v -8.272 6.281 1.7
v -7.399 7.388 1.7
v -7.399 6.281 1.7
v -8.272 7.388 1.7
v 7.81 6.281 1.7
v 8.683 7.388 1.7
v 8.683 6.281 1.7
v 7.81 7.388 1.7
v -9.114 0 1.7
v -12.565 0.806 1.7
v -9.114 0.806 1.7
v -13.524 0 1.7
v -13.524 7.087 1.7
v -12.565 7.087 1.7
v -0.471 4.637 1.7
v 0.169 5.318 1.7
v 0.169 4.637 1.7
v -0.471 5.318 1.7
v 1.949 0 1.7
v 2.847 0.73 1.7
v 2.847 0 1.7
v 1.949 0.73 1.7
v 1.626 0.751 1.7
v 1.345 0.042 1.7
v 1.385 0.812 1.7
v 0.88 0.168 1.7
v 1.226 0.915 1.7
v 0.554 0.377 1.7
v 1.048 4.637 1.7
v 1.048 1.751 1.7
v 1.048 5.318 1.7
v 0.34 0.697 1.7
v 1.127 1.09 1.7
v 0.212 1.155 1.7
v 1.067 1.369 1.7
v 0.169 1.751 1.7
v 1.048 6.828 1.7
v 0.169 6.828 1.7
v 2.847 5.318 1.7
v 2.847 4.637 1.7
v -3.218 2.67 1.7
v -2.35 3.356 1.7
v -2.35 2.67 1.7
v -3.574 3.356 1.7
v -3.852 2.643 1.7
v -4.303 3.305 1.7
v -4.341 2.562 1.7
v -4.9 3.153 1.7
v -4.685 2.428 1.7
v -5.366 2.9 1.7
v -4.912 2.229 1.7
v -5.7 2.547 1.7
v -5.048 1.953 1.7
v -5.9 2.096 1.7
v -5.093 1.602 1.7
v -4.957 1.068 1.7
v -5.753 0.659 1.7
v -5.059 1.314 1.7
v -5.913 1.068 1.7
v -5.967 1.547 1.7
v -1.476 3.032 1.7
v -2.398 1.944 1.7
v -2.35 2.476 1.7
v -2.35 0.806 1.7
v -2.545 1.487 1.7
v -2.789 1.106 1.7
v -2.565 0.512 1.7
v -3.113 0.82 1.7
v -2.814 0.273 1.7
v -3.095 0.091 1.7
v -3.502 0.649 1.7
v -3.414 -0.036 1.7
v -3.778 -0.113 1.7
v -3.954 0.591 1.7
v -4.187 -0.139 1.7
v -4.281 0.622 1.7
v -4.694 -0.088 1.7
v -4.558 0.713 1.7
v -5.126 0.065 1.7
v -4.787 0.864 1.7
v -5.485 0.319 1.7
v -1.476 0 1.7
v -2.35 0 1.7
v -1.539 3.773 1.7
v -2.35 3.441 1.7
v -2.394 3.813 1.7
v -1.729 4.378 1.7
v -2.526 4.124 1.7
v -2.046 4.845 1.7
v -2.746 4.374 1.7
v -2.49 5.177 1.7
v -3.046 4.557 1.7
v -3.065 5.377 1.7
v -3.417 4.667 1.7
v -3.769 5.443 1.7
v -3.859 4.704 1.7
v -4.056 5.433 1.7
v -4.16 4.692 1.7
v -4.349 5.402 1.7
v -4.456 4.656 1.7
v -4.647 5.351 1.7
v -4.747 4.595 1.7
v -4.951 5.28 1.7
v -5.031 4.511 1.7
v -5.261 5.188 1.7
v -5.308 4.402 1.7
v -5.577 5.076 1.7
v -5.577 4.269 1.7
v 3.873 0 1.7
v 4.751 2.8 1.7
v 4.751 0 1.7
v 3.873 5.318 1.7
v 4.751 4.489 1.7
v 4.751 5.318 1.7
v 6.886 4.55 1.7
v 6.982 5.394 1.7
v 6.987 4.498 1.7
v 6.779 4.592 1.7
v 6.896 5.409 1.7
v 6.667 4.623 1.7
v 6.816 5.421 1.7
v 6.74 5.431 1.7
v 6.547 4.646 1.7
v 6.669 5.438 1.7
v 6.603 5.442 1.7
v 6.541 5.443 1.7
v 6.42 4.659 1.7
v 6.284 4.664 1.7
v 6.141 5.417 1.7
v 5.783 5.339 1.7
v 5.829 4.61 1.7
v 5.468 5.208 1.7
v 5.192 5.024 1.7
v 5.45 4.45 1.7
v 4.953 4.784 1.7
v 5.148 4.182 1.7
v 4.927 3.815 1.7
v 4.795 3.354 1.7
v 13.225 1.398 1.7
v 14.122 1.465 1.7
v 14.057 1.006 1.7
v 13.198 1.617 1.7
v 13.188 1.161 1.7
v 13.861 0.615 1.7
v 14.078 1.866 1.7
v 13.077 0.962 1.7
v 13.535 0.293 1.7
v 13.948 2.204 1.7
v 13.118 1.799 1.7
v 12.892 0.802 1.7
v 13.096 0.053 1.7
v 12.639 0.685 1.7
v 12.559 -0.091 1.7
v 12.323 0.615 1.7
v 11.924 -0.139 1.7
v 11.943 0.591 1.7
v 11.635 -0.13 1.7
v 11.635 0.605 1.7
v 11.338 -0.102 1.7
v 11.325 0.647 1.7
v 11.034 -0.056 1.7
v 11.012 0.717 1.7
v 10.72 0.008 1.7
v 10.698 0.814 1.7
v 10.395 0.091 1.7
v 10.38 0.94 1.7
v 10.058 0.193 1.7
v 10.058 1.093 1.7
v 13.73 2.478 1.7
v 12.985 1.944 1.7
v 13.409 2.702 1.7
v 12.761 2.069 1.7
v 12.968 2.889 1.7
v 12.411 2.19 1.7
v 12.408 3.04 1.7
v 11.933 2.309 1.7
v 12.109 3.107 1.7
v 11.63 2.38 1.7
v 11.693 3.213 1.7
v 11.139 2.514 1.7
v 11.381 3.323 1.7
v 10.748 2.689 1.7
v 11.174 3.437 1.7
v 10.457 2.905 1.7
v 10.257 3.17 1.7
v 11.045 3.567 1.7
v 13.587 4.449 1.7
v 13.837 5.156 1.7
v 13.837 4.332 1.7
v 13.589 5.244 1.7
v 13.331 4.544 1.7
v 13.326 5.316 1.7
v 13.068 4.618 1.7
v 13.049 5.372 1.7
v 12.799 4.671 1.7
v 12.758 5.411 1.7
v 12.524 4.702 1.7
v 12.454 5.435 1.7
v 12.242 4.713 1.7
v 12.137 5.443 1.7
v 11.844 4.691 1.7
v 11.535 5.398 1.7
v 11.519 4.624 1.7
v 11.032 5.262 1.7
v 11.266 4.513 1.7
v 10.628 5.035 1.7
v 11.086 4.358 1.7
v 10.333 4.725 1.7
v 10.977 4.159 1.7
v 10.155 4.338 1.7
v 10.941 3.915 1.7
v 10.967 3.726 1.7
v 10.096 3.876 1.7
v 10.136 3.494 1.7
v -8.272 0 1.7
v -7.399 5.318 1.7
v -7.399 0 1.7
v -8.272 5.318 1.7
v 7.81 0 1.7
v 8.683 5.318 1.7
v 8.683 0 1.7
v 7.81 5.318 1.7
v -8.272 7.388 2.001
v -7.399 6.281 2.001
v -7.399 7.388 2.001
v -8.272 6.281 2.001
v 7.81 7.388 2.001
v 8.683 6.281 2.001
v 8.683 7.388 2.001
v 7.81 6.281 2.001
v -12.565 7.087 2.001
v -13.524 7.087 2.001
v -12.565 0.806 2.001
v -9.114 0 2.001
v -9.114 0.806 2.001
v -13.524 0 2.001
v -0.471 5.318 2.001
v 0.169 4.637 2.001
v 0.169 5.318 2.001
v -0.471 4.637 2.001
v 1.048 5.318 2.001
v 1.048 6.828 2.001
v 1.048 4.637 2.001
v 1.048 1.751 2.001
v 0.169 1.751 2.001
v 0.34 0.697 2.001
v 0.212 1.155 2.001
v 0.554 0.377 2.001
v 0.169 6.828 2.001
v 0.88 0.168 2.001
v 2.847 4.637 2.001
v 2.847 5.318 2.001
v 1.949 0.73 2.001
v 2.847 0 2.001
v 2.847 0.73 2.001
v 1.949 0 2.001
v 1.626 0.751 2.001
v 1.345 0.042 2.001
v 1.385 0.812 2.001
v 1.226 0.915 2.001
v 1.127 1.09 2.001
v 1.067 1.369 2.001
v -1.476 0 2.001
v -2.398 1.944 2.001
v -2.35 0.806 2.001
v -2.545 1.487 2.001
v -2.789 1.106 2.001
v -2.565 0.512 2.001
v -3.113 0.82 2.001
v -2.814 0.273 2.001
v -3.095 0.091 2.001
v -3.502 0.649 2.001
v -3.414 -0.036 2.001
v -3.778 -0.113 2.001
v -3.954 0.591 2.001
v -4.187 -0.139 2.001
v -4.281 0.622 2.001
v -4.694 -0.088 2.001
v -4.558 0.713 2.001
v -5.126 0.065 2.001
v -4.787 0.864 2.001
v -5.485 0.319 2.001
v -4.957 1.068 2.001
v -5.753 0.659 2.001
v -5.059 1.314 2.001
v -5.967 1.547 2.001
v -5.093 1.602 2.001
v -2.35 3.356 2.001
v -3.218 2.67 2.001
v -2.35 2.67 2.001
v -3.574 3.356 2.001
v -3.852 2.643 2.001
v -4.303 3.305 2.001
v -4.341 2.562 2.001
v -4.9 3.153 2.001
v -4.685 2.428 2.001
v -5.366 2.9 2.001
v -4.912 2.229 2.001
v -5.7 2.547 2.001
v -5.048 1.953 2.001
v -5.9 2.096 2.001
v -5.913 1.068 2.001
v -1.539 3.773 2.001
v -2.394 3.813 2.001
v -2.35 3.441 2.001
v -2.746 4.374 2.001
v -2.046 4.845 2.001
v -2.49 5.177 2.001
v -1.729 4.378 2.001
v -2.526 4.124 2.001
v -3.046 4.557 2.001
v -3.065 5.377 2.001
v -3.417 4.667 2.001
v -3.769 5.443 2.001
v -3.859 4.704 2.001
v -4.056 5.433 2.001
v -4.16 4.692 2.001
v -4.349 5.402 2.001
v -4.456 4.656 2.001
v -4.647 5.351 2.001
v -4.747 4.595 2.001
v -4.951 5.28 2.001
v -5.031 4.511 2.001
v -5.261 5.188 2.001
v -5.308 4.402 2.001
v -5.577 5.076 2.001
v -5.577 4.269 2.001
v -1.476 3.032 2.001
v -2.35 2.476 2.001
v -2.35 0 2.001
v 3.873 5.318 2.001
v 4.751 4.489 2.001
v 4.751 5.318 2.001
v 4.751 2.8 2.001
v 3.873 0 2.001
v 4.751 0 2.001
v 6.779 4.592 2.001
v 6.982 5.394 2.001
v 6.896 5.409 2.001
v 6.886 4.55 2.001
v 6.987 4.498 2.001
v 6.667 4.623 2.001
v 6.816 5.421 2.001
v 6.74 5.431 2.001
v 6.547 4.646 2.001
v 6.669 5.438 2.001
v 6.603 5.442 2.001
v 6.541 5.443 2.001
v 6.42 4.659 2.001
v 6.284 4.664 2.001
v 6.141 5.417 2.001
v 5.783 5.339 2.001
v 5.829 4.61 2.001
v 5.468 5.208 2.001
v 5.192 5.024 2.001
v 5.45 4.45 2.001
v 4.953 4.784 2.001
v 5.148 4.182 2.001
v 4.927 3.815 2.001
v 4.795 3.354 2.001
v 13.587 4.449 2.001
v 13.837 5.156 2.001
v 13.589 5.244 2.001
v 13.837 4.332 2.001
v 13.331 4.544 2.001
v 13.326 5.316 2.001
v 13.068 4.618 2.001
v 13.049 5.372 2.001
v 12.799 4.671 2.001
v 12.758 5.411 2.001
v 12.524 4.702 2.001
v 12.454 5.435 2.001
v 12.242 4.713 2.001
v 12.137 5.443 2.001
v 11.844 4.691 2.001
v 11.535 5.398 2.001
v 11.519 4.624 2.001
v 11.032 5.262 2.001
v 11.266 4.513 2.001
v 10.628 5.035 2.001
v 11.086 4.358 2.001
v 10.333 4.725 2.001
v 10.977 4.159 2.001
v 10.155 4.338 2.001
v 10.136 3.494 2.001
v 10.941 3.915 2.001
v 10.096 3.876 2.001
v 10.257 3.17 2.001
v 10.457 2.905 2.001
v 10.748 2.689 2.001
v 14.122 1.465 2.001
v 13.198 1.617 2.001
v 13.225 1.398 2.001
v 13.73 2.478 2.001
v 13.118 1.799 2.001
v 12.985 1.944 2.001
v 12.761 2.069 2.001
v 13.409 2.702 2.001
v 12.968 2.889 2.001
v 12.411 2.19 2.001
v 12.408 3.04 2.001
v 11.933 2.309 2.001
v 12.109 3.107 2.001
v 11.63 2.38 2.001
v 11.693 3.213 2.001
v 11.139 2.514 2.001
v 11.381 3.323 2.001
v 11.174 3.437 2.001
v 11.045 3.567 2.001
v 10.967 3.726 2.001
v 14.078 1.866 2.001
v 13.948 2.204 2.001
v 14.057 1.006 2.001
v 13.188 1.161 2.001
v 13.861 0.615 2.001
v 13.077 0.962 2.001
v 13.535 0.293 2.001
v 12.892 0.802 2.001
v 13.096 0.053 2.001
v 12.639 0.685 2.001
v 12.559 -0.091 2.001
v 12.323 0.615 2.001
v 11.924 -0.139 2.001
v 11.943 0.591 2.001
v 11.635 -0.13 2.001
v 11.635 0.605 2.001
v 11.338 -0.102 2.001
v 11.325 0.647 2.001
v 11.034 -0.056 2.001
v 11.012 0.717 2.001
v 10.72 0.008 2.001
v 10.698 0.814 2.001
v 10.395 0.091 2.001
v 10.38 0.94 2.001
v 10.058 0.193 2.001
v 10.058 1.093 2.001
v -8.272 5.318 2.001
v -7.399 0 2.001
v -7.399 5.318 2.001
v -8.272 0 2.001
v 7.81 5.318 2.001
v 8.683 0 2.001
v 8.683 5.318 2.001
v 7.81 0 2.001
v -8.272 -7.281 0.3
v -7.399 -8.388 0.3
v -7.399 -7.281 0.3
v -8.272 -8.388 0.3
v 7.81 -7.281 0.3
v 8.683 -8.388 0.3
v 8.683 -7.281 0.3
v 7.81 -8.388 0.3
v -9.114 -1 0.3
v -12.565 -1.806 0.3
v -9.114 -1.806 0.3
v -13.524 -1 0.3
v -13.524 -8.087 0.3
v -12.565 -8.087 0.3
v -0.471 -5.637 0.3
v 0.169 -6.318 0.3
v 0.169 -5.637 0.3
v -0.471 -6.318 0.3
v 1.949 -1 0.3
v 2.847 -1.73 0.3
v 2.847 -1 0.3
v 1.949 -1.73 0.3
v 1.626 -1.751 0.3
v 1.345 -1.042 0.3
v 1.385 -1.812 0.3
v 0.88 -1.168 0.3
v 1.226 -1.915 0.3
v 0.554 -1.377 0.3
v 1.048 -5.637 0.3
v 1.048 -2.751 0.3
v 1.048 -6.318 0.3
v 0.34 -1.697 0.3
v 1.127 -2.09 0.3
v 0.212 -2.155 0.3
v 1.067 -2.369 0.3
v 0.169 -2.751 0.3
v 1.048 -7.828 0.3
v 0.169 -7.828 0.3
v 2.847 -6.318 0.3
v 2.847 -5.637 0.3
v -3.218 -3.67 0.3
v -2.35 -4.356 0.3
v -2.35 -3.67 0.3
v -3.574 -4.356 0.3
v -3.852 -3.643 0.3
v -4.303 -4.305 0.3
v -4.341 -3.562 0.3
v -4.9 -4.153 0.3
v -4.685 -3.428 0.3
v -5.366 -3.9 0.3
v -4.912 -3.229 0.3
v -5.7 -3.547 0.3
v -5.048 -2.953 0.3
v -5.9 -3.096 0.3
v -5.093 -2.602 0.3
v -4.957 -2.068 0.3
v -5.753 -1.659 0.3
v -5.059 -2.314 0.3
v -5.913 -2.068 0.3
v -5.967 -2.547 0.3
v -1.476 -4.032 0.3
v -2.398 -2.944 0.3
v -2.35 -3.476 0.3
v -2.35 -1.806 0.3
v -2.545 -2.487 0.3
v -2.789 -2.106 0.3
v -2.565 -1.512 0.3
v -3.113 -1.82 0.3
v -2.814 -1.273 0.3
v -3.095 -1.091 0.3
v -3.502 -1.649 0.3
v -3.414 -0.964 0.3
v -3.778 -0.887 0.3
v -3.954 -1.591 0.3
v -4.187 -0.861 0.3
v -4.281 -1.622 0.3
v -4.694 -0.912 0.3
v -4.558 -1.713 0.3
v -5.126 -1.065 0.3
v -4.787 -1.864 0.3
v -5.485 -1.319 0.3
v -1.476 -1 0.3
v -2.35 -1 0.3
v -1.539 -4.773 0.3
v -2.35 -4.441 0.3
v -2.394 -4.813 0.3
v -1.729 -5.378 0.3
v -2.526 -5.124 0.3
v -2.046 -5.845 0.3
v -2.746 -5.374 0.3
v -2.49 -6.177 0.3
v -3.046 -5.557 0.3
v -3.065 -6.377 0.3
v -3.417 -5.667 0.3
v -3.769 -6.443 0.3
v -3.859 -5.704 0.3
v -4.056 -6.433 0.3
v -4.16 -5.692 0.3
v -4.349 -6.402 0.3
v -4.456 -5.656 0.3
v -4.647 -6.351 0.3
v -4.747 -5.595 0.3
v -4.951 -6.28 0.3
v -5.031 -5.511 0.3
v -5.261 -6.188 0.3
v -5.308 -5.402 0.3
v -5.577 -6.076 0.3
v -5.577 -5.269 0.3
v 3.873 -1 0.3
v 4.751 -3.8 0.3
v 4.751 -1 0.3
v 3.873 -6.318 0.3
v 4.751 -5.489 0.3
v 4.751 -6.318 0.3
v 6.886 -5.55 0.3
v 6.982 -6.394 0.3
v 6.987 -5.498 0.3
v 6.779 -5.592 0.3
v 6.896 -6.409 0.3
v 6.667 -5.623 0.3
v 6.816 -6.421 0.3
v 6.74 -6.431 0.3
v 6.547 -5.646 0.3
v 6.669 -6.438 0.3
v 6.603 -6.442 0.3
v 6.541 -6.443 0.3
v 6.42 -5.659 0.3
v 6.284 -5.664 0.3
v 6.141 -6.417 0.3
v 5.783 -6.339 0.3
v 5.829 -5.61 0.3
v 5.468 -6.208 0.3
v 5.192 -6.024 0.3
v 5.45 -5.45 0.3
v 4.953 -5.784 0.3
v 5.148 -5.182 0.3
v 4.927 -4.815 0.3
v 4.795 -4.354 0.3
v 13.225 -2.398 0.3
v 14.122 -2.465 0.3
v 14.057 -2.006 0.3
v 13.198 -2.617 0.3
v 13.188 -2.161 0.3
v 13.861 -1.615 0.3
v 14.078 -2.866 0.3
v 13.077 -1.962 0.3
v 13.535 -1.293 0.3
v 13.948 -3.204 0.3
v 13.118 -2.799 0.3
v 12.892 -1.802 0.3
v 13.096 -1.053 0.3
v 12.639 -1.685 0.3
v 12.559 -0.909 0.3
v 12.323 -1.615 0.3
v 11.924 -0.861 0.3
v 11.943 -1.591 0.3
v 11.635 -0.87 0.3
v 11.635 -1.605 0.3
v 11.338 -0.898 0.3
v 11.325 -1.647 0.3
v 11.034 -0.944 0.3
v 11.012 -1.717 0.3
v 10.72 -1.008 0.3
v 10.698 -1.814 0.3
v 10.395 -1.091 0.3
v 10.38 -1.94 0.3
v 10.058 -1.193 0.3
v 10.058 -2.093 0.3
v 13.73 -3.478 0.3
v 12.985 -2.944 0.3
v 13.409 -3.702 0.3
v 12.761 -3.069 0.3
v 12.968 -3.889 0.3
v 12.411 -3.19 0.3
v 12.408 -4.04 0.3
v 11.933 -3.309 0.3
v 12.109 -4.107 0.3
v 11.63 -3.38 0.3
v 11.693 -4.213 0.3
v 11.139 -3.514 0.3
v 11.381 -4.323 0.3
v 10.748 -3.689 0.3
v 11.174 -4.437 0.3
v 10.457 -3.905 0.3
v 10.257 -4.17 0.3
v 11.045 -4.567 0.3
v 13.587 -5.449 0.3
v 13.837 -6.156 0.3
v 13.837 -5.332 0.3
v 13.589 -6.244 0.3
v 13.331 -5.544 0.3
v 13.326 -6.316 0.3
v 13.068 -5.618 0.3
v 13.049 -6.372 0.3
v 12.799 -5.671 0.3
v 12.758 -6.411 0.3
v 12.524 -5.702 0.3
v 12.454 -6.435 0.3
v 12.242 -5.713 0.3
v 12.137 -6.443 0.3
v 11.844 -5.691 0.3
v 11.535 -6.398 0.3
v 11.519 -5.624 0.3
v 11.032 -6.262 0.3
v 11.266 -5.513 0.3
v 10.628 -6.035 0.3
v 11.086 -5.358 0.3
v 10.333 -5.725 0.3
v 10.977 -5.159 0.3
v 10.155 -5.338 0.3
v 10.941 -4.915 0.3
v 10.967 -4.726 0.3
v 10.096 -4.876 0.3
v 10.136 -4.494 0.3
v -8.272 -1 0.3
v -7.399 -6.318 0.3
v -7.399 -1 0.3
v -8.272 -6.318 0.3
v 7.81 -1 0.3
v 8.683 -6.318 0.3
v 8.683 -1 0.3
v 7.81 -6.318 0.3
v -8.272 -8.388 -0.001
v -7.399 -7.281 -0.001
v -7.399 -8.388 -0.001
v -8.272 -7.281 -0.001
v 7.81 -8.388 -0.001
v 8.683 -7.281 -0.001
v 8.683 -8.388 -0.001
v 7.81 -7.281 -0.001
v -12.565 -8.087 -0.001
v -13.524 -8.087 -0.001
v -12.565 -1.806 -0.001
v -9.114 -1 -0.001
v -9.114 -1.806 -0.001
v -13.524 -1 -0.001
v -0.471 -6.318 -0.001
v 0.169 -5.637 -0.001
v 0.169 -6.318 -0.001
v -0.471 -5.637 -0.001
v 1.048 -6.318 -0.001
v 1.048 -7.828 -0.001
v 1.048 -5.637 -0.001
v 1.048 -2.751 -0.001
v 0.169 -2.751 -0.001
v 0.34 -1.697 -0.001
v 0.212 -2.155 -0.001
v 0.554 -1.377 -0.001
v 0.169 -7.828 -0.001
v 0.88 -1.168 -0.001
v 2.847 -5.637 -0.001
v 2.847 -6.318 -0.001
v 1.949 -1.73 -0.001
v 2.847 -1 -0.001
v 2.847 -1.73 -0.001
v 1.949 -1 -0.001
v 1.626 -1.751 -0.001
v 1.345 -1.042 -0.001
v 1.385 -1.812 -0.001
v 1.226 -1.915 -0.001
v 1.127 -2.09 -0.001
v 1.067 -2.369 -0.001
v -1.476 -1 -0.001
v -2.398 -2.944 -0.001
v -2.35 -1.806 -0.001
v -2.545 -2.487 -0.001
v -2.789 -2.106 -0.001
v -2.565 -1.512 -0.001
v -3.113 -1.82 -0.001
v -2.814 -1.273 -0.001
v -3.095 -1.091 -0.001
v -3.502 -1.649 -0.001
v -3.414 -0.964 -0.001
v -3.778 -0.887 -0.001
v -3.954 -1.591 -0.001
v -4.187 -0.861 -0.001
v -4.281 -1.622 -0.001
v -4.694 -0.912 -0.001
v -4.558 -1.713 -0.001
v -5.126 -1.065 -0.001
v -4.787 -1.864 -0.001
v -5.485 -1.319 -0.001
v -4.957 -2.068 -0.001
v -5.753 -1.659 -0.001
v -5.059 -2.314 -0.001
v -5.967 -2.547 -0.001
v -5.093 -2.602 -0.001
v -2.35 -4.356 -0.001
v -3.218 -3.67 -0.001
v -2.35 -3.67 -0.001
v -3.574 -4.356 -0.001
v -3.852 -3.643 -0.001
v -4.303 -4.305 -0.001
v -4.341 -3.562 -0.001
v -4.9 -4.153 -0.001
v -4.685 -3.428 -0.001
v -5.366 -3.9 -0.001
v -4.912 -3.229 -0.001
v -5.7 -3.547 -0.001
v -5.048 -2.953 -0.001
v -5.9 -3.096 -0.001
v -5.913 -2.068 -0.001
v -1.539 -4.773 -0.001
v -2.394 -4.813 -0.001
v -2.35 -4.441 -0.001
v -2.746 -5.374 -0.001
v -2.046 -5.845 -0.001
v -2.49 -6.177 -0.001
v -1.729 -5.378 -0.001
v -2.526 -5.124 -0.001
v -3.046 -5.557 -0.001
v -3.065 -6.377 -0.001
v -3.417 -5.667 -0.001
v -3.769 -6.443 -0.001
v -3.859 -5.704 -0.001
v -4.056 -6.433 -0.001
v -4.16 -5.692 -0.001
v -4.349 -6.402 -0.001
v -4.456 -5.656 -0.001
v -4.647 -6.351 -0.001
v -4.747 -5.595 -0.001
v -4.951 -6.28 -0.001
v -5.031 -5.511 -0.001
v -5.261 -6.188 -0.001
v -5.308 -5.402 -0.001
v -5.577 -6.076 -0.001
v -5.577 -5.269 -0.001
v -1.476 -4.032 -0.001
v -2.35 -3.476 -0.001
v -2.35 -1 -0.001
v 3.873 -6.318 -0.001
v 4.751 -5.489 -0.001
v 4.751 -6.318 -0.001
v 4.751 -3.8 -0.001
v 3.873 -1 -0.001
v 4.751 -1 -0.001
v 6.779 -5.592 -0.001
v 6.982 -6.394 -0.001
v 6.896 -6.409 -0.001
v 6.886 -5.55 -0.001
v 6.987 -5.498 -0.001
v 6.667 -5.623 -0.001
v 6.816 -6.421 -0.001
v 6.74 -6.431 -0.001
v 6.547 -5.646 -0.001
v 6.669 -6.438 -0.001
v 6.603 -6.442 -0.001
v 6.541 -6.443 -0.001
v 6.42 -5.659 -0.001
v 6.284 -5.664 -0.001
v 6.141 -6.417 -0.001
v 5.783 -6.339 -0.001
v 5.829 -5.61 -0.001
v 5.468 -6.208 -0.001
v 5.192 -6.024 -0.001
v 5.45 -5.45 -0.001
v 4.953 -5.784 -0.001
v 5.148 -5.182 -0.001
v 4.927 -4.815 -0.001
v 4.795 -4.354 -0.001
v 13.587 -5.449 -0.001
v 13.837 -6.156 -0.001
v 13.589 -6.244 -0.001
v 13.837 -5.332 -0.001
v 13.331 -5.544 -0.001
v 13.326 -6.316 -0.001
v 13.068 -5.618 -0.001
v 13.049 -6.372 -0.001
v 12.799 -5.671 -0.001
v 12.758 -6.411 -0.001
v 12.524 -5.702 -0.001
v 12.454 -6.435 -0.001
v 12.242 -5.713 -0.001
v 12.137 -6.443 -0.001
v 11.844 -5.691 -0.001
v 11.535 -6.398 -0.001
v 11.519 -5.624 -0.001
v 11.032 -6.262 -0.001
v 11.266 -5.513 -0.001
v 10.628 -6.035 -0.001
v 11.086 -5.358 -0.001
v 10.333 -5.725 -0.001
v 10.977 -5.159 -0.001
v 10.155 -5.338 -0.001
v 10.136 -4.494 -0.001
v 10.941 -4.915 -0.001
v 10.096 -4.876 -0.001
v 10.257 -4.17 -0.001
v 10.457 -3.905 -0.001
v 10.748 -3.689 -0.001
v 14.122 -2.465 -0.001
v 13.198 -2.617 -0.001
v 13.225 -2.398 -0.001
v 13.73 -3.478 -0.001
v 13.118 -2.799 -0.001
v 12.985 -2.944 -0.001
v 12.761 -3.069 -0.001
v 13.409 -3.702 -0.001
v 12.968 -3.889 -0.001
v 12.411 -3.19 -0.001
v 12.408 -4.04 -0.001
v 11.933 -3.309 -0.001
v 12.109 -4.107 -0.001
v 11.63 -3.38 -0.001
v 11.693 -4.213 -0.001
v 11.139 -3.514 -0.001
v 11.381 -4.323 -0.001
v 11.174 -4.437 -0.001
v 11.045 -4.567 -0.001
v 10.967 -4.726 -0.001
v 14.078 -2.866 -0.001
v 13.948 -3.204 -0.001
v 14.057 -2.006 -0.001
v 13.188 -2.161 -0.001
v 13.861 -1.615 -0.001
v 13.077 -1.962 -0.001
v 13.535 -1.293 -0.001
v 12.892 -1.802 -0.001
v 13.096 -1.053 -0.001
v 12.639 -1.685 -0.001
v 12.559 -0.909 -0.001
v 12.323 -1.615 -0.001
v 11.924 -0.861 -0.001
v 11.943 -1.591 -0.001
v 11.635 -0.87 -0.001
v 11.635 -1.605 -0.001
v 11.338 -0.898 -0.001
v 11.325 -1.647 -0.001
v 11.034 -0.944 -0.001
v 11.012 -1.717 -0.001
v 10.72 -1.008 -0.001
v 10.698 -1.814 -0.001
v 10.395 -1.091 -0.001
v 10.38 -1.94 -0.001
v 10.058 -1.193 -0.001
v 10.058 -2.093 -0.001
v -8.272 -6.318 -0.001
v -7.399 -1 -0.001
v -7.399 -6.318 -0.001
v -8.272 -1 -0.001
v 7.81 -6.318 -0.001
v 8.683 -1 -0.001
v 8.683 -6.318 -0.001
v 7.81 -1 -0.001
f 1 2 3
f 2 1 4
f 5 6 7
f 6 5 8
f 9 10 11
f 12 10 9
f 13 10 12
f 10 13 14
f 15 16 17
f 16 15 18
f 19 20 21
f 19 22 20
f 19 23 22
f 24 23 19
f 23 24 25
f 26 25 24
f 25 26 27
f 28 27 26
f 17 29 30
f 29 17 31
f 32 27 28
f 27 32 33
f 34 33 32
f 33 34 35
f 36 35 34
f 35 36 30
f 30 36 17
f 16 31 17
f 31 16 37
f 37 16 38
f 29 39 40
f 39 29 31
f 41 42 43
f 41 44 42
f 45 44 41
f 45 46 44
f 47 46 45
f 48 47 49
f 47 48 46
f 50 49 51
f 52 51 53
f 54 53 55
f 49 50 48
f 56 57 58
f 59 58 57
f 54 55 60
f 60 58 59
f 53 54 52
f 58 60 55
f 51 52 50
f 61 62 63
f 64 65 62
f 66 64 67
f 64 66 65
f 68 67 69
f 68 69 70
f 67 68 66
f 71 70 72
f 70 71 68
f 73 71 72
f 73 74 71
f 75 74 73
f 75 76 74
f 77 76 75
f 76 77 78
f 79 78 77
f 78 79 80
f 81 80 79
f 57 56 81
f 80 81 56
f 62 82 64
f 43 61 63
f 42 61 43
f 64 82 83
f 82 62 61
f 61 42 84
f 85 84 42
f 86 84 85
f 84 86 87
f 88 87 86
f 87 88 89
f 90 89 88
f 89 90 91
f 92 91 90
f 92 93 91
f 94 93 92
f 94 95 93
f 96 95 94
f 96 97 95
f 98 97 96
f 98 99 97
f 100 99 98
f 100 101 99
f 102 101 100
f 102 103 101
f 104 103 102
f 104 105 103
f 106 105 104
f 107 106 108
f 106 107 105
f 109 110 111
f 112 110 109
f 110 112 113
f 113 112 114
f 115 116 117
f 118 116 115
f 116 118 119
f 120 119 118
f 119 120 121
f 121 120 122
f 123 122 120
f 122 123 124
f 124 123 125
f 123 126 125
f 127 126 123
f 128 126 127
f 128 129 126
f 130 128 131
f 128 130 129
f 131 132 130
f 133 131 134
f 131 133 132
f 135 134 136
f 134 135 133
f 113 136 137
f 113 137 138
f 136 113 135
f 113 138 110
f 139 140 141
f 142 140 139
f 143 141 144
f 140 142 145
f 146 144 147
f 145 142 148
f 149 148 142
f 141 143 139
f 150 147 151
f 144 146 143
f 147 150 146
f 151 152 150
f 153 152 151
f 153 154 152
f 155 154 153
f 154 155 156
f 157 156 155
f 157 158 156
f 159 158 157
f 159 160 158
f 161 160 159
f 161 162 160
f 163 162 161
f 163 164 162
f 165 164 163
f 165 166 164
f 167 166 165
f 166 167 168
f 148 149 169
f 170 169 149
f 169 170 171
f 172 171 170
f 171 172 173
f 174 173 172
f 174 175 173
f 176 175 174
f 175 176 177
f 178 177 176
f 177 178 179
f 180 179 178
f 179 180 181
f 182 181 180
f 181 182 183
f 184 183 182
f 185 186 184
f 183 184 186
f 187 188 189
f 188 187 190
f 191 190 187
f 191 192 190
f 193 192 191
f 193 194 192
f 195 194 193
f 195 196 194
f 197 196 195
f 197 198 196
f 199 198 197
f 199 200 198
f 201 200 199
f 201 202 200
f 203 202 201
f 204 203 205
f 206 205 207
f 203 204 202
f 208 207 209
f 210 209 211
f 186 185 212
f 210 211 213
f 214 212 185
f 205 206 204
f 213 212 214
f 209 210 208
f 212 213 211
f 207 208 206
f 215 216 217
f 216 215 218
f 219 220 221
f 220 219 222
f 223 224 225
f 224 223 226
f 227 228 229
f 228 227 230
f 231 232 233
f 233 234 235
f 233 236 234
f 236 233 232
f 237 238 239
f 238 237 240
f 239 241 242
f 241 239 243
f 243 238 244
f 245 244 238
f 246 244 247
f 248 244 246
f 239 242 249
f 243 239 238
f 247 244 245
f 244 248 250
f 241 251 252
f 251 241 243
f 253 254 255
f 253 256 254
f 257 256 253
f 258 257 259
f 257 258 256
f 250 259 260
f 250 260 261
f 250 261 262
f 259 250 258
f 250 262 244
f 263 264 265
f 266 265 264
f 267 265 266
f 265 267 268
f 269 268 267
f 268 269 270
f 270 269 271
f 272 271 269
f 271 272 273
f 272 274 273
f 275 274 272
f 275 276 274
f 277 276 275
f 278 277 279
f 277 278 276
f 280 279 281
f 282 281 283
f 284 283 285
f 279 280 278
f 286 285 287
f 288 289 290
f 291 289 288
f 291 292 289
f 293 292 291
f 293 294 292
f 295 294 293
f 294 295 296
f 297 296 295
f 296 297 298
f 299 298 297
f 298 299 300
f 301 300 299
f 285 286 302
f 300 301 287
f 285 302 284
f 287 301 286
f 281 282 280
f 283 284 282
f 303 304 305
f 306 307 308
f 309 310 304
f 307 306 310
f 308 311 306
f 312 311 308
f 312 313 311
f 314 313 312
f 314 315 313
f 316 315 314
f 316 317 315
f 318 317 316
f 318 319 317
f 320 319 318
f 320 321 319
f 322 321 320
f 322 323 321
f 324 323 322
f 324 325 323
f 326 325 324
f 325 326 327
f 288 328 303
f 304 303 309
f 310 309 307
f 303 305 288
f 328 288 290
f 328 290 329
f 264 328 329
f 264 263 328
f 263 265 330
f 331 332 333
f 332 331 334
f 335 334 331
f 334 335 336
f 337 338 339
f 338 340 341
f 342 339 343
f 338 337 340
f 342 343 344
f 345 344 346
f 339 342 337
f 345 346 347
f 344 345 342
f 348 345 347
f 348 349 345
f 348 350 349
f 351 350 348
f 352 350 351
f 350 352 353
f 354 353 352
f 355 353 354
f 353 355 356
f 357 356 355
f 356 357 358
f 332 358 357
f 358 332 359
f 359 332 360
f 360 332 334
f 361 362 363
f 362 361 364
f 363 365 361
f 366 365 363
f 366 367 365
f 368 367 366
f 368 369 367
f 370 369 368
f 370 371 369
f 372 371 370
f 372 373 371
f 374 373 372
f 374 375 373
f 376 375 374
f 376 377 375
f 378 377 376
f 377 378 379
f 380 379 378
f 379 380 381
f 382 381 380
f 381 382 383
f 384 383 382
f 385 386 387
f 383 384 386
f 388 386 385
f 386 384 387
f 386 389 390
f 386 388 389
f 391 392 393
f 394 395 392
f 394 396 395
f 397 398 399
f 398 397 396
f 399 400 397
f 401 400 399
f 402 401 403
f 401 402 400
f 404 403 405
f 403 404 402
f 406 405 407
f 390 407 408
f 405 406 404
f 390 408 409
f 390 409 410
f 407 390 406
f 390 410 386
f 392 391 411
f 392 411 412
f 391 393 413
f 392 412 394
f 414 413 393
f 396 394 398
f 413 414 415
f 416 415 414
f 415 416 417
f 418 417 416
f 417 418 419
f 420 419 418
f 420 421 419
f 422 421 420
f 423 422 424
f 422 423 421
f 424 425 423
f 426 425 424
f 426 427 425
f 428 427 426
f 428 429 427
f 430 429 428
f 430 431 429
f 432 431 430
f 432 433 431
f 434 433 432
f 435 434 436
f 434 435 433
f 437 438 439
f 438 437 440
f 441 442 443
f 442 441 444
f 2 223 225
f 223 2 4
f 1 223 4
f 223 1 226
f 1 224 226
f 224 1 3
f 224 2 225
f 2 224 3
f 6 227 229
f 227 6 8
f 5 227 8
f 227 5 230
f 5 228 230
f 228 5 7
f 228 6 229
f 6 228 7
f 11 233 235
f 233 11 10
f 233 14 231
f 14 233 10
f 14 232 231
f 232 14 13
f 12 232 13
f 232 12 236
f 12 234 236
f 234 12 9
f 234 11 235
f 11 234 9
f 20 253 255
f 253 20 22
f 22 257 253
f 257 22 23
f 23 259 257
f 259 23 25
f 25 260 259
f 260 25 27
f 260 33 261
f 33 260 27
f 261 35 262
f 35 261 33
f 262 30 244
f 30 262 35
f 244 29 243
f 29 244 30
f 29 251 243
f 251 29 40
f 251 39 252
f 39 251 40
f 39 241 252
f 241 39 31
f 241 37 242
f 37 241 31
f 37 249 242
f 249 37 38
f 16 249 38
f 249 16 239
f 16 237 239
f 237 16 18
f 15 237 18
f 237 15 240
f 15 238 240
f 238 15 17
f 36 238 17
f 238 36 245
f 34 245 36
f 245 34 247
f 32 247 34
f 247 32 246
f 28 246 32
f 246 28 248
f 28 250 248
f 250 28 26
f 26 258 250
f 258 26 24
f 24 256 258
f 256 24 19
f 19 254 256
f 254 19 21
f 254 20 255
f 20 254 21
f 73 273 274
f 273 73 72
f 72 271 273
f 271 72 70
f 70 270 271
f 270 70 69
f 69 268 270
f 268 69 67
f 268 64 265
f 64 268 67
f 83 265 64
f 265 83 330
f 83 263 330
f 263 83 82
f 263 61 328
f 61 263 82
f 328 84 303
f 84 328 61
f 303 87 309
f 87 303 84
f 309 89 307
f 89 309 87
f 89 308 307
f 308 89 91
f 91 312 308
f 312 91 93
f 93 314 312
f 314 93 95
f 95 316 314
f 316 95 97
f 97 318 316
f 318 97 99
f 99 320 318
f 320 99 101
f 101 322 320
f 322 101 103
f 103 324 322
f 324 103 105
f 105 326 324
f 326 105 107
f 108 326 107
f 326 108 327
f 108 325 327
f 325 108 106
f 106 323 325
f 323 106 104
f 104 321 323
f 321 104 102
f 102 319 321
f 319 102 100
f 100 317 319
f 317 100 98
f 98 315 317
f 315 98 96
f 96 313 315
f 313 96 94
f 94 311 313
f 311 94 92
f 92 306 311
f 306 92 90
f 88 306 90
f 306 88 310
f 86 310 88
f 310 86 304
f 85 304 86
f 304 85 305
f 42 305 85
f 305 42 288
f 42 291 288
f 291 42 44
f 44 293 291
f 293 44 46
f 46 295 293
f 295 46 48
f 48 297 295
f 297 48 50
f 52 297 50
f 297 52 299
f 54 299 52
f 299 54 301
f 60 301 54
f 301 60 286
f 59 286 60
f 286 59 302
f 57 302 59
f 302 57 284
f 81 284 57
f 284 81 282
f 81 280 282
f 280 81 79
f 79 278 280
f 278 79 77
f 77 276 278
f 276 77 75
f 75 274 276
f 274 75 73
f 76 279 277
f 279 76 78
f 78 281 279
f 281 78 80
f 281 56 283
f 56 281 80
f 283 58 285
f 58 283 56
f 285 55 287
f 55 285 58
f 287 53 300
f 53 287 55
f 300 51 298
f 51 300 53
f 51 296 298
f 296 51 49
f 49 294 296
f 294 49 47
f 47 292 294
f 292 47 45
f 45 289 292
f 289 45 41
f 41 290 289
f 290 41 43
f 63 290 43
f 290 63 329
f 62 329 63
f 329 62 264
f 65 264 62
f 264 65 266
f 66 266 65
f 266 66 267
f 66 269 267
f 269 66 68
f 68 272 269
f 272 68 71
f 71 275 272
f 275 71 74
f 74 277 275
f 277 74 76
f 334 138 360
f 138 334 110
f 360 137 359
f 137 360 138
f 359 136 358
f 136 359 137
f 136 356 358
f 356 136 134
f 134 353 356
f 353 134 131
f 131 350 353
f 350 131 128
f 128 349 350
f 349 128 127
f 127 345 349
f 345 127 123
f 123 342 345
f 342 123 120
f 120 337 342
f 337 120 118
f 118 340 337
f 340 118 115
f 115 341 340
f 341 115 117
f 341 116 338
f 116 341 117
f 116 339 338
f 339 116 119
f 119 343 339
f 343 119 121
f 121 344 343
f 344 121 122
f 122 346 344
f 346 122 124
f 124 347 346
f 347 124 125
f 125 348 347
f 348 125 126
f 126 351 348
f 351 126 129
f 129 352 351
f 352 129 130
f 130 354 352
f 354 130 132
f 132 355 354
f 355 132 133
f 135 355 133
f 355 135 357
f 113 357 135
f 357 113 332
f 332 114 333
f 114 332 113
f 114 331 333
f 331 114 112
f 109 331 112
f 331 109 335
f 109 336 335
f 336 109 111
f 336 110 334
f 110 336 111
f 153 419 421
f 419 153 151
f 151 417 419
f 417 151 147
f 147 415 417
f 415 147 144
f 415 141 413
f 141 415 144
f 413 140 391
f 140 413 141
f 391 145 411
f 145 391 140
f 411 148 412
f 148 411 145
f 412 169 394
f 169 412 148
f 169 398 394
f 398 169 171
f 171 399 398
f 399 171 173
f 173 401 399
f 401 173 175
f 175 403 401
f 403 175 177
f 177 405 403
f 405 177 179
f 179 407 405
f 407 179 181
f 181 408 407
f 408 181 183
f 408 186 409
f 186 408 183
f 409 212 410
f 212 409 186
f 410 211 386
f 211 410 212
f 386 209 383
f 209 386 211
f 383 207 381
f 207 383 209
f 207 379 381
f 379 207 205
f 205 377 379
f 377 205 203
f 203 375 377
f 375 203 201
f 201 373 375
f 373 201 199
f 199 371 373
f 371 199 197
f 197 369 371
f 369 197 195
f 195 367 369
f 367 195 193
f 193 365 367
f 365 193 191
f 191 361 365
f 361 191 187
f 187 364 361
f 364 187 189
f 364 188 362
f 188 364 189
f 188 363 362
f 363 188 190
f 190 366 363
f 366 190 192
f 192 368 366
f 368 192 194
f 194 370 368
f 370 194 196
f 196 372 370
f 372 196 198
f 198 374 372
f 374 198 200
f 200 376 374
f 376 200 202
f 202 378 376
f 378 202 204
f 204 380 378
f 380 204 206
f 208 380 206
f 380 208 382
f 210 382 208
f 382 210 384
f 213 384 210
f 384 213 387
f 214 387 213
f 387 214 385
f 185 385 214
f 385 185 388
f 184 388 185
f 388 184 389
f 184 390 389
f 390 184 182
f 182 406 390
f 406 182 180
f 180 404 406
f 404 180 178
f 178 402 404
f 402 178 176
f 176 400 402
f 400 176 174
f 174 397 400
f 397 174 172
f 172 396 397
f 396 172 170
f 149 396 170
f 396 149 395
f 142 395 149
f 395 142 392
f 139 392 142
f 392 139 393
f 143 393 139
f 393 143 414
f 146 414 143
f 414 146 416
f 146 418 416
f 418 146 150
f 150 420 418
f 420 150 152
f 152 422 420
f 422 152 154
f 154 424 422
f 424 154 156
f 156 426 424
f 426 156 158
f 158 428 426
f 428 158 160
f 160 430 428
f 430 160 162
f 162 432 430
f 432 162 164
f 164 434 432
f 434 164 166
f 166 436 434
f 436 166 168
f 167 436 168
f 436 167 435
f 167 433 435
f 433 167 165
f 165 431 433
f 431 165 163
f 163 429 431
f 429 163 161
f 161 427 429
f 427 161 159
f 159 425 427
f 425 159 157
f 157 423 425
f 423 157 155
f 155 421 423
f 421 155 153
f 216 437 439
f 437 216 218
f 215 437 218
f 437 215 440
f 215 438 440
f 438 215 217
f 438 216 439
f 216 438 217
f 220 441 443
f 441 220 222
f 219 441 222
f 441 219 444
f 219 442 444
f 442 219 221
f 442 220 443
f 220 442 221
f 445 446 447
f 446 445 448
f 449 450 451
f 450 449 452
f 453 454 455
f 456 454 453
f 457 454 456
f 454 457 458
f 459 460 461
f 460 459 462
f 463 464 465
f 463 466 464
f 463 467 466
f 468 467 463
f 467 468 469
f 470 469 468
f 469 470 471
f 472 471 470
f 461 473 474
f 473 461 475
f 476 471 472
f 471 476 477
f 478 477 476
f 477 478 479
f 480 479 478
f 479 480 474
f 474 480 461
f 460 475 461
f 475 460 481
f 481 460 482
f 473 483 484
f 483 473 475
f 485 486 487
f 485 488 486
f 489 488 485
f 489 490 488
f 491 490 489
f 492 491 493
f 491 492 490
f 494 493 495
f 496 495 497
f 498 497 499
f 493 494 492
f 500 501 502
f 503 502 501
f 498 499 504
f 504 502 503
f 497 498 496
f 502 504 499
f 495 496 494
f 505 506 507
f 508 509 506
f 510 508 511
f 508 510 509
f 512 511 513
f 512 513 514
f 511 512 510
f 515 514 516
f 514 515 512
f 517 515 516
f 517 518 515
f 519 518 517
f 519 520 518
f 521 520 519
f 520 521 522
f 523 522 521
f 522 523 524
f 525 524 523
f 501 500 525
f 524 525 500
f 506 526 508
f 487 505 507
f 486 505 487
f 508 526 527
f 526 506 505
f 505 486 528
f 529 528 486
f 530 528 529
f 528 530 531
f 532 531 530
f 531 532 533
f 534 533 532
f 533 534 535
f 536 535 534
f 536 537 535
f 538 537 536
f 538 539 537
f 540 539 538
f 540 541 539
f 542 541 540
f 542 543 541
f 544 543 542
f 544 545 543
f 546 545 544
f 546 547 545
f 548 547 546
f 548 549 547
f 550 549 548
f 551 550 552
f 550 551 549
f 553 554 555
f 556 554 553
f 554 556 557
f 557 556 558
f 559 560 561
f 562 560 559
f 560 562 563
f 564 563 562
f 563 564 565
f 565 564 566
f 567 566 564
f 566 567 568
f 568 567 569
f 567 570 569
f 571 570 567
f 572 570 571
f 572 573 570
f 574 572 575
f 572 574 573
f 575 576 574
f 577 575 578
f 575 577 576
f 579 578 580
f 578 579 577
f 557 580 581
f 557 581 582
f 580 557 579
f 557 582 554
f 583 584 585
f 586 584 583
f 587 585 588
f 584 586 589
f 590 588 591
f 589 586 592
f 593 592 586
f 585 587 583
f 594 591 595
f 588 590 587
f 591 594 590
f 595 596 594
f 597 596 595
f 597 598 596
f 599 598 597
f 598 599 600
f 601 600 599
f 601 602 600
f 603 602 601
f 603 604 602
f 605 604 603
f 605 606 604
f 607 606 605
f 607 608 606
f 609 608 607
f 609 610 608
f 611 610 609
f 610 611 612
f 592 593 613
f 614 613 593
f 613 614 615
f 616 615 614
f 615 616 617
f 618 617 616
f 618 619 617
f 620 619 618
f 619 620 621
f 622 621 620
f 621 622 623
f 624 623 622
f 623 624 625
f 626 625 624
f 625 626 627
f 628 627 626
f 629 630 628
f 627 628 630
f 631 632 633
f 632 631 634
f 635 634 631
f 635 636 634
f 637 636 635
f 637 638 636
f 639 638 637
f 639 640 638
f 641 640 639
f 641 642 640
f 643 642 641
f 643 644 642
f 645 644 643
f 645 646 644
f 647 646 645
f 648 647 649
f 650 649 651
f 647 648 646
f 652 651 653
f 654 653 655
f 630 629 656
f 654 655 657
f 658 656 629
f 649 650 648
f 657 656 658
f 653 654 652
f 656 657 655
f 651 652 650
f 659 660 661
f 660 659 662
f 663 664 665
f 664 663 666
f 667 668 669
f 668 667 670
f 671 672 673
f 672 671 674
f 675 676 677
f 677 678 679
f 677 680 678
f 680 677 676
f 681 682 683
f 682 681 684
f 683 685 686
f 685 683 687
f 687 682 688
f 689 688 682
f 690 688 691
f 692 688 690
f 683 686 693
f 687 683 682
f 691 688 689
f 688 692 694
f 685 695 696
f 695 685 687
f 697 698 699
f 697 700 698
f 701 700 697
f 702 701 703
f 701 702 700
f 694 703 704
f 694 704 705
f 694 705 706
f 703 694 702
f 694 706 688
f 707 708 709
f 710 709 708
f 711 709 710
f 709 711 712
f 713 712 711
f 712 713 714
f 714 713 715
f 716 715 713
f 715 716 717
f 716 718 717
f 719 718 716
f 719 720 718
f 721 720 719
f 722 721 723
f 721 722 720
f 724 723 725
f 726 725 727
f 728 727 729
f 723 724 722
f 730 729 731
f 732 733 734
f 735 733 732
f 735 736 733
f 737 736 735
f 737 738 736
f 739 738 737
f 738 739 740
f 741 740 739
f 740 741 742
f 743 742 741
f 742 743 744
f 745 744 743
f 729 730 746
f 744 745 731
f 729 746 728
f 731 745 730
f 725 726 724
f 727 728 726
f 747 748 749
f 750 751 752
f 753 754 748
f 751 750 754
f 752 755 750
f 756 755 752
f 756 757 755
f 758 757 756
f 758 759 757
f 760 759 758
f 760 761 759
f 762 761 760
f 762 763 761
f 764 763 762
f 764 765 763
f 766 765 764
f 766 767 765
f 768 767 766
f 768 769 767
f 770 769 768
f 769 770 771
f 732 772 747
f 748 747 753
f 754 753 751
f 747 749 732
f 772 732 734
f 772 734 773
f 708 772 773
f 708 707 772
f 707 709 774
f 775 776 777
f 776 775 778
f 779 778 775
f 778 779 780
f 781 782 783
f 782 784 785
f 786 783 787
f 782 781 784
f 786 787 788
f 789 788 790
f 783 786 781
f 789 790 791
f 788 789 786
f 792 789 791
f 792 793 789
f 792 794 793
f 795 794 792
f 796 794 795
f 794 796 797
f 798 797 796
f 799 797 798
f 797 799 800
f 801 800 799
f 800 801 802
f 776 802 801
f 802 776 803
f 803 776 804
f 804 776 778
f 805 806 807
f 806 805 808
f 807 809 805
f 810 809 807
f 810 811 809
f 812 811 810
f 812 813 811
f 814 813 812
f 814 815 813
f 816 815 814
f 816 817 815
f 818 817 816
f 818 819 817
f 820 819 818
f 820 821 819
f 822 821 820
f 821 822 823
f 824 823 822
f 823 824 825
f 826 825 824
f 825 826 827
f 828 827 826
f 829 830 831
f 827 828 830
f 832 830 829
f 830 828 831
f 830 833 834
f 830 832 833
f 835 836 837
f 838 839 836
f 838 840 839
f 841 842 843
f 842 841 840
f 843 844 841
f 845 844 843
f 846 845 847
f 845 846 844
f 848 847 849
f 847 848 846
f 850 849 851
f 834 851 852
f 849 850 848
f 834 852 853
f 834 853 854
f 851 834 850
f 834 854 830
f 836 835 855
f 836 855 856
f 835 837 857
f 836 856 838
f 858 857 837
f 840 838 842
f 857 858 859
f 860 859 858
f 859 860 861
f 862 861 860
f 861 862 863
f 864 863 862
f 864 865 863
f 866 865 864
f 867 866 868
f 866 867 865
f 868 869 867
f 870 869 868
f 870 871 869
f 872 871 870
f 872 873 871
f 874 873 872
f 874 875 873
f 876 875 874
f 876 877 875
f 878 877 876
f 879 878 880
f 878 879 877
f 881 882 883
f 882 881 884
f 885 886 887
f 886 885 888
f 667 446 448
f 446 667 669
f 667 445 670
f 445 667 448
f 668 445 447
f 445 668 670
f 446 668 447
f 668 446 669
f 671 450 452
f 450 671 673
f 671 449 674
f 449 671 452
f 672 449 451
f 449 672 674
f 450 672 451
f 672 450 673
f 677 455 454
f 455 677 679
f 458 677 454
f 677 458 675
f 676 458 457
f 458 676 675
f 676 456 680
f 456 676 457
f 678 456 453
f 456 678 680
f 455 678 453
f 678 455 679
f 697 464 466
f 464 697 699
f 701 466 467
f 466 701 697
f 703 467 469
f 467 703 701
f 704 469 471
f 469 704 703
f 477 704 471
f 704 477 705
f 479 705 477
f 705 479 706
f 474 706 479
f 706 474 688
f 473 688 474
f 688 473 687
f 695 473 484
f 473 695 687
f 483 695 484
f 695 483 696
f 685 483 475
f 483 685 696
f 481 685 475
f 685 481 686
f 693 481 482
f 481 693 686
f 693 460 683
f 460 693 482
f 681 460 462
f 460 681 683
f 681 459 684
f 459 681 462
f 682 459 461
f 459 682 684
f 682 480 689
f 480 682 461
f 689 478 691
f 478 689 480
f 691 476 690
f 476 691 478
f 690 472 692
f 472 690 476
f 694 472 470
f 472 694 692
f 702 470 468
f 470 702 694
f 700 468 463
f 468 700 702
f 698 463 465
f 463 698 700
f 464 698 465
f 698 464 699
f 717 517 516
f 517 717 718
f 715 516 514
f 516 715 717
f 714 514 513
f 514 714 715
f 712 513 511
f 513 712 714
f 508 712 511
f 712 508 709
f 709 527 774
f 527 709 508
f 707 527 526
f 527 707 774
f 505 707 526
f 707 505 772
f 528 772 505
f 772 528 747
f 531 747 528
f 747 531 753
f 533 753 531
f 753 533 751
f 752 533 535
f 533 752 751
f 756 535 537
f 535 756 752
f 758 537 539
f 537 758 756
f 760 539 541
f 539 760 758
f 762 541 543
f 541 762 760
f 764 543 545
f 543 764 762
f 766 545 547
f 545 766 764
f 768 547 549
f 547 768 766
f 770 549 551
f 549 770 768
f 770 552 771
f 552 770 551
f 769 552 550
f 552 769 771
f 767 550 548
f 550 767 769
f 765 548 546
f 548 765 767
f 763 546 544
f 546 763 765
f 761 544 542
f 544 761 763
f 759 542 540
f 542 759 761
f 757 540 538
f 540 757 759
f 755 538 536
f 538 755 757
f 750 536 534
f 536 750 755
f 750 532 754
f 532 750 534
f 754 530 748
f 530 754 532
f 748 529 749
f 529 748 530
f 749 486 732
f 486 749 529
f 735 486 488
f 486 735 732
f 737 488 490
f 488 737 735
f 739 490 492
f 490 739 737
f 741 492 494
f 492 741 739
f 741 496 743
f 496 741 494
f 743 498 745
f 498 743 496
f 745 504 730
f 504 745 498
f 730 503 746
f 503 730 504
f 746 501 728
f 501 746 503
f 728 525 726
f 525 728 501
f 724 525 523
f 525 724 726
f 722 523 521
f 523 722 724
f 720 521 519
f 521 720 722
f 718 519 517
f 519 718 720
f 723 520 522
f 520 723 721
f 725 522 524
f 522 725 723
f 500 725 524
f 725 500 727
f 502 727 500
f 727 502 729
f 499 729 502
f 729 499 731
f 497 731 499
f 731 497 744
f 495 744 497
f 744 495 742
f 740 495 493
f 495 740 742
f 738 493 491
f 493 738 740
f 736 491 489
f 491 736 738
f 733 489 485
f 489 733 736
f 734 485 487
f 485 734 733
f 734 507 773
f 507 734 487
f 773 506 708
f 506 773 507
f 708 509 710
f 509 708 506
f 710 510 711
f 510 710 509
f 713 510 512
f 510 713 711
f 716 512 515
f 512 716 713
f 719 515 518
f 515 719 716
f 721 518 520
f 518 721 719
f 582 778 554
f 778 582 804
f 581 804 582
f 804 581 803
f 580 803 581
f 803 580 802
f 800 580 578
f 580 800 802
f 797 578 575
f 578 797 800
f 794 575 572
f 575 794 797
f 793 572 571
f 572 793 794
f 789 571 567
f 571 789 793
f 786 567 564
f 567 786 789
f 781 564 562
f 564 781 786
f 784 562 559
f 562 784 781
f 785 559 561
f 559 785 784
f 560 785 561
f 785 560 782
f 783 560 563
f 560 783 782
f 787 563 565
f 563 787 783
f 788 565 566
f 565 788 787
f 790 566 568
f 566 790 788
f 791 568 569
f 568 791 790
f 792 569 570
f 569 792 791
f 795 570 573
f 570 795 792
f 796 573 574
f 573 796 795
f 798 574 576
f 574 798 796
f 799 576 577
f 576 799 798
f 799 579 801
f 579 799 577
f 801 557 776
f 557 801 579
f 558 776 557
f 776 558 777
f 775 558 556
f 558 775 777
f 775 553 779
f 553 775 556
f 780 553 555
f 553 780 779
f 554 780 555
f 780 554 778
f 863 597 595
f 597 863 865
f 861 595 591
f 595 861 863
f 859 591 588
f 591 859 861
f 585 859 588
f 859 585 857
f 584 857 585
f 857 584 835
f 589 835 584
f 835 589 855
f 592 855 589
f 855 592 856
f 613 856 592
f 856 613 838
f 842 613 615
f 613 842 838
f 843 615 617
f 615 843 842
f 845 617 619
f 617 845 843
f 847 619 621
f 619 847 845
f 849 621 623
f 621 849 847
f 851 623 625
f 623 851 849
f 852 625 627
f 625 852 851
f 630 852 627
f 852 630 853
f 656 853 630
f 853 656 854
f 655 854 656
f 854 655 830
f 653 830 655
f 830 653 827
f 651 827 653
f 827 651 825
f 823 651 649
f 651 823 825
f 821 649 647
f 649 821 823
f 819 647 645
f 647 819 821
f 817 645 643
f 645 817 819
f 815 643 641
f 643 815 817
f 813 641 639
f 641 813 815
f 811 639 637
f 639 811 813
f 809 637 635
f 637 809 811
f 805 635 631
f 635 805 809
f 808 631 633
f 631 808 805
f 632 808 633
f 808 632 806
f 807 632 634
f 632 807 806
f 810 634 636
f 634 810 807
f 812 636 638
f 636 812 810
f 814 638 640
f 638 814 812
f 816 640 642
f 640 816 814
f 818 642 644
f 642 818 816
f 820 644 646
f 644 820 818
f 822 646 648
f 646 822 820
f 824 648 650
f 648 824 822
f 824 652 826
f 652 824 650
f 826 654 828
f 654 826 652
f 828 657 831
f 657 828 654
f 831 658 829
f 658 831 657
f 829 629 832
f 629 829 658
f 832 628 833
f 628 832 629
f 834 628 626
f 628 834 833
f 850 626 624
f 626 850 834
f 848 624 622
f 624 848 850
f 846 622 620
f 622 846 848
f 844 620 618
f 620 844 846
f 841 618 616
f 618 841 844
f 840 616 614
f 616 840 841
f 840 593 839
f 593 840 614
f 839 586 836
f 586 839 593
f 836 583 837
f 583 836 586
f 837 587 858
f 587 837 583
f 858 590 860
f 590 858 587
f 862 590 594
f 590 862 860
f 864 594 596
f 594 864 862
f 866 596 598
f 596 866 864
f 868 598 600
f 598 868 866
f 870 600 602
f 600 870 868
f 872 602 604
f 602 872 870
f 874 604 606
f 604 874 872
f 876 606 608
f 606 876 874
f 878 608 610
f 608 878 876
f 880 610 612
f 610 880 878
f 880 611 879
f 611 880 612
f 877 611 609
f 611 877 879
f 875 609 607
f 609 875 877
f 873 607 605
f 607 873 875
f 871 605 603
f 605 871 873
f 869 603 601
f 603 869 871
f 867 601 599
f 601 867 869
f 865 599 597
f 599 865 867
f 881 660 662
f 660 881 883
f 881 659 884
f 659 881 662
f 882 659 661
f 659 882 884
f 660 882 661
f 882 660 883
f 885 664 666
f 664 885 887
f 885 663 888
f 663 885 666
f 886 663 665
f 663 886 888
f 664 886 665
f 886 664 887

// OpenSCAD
letter="Liatris";
smallText="";
    
length = 90;    
textStart = 0; 
height = 2; 

module GetText(bigText, littleText) { 
    union() {         
        translate([textStart, 0, 1.7])
            color("black", 1)
                linear_extrude(height=.301, convexity=4)
                    text(bigText, 
                    font="Bitstream Vera Sans",
                    halign="center",
                    size=7
                    );
        
        translate([textStart, -8, 1.7])
            color("black", 1)
                linear_extrude(height=.301, convexity=4)
                    text(littleText, 
                    font="Bitstream Vera Sans",
                    halign="center",
                    size=5// 3 is too small, doesn't extrude
                          // 4 is readable, but leaves gaps
                    );
            }
}

// First extrusion 
*difference () { 
    color("white", 1.0)
        union() { 
            //stem
            translate([-length/2 - 100, -2, 0])
                cube([100, 4, height]);
            
            // tapered neck 
            linear_extrude(height) { 
                polygon(points=[[-length/2 -30, 0], [-length / 2, +10], [-length /2, -10], [-length / 2 - 30, 0]]);
            } 
            
            //Broad flat area for text
            translate([-length/2, -10, 0])
                cube([length, 20, height], center=false) ;
        }
    
    // holes for text 
    color("black", 1) 
        union() { 
            GetText(letter, smallText); 

            rotate([180, 0, 0])
                translate([textStart, 1, -2])
                    GetText(letter, smallText); 
        }
}

// Second Extrusion
/*marker_two*/union() { 
    GetText(letter, smallText); 

    rotate([180, 0, 0])
        translate([textStart, 1, -2])
            GetText(letter, smallText); 
}

    
